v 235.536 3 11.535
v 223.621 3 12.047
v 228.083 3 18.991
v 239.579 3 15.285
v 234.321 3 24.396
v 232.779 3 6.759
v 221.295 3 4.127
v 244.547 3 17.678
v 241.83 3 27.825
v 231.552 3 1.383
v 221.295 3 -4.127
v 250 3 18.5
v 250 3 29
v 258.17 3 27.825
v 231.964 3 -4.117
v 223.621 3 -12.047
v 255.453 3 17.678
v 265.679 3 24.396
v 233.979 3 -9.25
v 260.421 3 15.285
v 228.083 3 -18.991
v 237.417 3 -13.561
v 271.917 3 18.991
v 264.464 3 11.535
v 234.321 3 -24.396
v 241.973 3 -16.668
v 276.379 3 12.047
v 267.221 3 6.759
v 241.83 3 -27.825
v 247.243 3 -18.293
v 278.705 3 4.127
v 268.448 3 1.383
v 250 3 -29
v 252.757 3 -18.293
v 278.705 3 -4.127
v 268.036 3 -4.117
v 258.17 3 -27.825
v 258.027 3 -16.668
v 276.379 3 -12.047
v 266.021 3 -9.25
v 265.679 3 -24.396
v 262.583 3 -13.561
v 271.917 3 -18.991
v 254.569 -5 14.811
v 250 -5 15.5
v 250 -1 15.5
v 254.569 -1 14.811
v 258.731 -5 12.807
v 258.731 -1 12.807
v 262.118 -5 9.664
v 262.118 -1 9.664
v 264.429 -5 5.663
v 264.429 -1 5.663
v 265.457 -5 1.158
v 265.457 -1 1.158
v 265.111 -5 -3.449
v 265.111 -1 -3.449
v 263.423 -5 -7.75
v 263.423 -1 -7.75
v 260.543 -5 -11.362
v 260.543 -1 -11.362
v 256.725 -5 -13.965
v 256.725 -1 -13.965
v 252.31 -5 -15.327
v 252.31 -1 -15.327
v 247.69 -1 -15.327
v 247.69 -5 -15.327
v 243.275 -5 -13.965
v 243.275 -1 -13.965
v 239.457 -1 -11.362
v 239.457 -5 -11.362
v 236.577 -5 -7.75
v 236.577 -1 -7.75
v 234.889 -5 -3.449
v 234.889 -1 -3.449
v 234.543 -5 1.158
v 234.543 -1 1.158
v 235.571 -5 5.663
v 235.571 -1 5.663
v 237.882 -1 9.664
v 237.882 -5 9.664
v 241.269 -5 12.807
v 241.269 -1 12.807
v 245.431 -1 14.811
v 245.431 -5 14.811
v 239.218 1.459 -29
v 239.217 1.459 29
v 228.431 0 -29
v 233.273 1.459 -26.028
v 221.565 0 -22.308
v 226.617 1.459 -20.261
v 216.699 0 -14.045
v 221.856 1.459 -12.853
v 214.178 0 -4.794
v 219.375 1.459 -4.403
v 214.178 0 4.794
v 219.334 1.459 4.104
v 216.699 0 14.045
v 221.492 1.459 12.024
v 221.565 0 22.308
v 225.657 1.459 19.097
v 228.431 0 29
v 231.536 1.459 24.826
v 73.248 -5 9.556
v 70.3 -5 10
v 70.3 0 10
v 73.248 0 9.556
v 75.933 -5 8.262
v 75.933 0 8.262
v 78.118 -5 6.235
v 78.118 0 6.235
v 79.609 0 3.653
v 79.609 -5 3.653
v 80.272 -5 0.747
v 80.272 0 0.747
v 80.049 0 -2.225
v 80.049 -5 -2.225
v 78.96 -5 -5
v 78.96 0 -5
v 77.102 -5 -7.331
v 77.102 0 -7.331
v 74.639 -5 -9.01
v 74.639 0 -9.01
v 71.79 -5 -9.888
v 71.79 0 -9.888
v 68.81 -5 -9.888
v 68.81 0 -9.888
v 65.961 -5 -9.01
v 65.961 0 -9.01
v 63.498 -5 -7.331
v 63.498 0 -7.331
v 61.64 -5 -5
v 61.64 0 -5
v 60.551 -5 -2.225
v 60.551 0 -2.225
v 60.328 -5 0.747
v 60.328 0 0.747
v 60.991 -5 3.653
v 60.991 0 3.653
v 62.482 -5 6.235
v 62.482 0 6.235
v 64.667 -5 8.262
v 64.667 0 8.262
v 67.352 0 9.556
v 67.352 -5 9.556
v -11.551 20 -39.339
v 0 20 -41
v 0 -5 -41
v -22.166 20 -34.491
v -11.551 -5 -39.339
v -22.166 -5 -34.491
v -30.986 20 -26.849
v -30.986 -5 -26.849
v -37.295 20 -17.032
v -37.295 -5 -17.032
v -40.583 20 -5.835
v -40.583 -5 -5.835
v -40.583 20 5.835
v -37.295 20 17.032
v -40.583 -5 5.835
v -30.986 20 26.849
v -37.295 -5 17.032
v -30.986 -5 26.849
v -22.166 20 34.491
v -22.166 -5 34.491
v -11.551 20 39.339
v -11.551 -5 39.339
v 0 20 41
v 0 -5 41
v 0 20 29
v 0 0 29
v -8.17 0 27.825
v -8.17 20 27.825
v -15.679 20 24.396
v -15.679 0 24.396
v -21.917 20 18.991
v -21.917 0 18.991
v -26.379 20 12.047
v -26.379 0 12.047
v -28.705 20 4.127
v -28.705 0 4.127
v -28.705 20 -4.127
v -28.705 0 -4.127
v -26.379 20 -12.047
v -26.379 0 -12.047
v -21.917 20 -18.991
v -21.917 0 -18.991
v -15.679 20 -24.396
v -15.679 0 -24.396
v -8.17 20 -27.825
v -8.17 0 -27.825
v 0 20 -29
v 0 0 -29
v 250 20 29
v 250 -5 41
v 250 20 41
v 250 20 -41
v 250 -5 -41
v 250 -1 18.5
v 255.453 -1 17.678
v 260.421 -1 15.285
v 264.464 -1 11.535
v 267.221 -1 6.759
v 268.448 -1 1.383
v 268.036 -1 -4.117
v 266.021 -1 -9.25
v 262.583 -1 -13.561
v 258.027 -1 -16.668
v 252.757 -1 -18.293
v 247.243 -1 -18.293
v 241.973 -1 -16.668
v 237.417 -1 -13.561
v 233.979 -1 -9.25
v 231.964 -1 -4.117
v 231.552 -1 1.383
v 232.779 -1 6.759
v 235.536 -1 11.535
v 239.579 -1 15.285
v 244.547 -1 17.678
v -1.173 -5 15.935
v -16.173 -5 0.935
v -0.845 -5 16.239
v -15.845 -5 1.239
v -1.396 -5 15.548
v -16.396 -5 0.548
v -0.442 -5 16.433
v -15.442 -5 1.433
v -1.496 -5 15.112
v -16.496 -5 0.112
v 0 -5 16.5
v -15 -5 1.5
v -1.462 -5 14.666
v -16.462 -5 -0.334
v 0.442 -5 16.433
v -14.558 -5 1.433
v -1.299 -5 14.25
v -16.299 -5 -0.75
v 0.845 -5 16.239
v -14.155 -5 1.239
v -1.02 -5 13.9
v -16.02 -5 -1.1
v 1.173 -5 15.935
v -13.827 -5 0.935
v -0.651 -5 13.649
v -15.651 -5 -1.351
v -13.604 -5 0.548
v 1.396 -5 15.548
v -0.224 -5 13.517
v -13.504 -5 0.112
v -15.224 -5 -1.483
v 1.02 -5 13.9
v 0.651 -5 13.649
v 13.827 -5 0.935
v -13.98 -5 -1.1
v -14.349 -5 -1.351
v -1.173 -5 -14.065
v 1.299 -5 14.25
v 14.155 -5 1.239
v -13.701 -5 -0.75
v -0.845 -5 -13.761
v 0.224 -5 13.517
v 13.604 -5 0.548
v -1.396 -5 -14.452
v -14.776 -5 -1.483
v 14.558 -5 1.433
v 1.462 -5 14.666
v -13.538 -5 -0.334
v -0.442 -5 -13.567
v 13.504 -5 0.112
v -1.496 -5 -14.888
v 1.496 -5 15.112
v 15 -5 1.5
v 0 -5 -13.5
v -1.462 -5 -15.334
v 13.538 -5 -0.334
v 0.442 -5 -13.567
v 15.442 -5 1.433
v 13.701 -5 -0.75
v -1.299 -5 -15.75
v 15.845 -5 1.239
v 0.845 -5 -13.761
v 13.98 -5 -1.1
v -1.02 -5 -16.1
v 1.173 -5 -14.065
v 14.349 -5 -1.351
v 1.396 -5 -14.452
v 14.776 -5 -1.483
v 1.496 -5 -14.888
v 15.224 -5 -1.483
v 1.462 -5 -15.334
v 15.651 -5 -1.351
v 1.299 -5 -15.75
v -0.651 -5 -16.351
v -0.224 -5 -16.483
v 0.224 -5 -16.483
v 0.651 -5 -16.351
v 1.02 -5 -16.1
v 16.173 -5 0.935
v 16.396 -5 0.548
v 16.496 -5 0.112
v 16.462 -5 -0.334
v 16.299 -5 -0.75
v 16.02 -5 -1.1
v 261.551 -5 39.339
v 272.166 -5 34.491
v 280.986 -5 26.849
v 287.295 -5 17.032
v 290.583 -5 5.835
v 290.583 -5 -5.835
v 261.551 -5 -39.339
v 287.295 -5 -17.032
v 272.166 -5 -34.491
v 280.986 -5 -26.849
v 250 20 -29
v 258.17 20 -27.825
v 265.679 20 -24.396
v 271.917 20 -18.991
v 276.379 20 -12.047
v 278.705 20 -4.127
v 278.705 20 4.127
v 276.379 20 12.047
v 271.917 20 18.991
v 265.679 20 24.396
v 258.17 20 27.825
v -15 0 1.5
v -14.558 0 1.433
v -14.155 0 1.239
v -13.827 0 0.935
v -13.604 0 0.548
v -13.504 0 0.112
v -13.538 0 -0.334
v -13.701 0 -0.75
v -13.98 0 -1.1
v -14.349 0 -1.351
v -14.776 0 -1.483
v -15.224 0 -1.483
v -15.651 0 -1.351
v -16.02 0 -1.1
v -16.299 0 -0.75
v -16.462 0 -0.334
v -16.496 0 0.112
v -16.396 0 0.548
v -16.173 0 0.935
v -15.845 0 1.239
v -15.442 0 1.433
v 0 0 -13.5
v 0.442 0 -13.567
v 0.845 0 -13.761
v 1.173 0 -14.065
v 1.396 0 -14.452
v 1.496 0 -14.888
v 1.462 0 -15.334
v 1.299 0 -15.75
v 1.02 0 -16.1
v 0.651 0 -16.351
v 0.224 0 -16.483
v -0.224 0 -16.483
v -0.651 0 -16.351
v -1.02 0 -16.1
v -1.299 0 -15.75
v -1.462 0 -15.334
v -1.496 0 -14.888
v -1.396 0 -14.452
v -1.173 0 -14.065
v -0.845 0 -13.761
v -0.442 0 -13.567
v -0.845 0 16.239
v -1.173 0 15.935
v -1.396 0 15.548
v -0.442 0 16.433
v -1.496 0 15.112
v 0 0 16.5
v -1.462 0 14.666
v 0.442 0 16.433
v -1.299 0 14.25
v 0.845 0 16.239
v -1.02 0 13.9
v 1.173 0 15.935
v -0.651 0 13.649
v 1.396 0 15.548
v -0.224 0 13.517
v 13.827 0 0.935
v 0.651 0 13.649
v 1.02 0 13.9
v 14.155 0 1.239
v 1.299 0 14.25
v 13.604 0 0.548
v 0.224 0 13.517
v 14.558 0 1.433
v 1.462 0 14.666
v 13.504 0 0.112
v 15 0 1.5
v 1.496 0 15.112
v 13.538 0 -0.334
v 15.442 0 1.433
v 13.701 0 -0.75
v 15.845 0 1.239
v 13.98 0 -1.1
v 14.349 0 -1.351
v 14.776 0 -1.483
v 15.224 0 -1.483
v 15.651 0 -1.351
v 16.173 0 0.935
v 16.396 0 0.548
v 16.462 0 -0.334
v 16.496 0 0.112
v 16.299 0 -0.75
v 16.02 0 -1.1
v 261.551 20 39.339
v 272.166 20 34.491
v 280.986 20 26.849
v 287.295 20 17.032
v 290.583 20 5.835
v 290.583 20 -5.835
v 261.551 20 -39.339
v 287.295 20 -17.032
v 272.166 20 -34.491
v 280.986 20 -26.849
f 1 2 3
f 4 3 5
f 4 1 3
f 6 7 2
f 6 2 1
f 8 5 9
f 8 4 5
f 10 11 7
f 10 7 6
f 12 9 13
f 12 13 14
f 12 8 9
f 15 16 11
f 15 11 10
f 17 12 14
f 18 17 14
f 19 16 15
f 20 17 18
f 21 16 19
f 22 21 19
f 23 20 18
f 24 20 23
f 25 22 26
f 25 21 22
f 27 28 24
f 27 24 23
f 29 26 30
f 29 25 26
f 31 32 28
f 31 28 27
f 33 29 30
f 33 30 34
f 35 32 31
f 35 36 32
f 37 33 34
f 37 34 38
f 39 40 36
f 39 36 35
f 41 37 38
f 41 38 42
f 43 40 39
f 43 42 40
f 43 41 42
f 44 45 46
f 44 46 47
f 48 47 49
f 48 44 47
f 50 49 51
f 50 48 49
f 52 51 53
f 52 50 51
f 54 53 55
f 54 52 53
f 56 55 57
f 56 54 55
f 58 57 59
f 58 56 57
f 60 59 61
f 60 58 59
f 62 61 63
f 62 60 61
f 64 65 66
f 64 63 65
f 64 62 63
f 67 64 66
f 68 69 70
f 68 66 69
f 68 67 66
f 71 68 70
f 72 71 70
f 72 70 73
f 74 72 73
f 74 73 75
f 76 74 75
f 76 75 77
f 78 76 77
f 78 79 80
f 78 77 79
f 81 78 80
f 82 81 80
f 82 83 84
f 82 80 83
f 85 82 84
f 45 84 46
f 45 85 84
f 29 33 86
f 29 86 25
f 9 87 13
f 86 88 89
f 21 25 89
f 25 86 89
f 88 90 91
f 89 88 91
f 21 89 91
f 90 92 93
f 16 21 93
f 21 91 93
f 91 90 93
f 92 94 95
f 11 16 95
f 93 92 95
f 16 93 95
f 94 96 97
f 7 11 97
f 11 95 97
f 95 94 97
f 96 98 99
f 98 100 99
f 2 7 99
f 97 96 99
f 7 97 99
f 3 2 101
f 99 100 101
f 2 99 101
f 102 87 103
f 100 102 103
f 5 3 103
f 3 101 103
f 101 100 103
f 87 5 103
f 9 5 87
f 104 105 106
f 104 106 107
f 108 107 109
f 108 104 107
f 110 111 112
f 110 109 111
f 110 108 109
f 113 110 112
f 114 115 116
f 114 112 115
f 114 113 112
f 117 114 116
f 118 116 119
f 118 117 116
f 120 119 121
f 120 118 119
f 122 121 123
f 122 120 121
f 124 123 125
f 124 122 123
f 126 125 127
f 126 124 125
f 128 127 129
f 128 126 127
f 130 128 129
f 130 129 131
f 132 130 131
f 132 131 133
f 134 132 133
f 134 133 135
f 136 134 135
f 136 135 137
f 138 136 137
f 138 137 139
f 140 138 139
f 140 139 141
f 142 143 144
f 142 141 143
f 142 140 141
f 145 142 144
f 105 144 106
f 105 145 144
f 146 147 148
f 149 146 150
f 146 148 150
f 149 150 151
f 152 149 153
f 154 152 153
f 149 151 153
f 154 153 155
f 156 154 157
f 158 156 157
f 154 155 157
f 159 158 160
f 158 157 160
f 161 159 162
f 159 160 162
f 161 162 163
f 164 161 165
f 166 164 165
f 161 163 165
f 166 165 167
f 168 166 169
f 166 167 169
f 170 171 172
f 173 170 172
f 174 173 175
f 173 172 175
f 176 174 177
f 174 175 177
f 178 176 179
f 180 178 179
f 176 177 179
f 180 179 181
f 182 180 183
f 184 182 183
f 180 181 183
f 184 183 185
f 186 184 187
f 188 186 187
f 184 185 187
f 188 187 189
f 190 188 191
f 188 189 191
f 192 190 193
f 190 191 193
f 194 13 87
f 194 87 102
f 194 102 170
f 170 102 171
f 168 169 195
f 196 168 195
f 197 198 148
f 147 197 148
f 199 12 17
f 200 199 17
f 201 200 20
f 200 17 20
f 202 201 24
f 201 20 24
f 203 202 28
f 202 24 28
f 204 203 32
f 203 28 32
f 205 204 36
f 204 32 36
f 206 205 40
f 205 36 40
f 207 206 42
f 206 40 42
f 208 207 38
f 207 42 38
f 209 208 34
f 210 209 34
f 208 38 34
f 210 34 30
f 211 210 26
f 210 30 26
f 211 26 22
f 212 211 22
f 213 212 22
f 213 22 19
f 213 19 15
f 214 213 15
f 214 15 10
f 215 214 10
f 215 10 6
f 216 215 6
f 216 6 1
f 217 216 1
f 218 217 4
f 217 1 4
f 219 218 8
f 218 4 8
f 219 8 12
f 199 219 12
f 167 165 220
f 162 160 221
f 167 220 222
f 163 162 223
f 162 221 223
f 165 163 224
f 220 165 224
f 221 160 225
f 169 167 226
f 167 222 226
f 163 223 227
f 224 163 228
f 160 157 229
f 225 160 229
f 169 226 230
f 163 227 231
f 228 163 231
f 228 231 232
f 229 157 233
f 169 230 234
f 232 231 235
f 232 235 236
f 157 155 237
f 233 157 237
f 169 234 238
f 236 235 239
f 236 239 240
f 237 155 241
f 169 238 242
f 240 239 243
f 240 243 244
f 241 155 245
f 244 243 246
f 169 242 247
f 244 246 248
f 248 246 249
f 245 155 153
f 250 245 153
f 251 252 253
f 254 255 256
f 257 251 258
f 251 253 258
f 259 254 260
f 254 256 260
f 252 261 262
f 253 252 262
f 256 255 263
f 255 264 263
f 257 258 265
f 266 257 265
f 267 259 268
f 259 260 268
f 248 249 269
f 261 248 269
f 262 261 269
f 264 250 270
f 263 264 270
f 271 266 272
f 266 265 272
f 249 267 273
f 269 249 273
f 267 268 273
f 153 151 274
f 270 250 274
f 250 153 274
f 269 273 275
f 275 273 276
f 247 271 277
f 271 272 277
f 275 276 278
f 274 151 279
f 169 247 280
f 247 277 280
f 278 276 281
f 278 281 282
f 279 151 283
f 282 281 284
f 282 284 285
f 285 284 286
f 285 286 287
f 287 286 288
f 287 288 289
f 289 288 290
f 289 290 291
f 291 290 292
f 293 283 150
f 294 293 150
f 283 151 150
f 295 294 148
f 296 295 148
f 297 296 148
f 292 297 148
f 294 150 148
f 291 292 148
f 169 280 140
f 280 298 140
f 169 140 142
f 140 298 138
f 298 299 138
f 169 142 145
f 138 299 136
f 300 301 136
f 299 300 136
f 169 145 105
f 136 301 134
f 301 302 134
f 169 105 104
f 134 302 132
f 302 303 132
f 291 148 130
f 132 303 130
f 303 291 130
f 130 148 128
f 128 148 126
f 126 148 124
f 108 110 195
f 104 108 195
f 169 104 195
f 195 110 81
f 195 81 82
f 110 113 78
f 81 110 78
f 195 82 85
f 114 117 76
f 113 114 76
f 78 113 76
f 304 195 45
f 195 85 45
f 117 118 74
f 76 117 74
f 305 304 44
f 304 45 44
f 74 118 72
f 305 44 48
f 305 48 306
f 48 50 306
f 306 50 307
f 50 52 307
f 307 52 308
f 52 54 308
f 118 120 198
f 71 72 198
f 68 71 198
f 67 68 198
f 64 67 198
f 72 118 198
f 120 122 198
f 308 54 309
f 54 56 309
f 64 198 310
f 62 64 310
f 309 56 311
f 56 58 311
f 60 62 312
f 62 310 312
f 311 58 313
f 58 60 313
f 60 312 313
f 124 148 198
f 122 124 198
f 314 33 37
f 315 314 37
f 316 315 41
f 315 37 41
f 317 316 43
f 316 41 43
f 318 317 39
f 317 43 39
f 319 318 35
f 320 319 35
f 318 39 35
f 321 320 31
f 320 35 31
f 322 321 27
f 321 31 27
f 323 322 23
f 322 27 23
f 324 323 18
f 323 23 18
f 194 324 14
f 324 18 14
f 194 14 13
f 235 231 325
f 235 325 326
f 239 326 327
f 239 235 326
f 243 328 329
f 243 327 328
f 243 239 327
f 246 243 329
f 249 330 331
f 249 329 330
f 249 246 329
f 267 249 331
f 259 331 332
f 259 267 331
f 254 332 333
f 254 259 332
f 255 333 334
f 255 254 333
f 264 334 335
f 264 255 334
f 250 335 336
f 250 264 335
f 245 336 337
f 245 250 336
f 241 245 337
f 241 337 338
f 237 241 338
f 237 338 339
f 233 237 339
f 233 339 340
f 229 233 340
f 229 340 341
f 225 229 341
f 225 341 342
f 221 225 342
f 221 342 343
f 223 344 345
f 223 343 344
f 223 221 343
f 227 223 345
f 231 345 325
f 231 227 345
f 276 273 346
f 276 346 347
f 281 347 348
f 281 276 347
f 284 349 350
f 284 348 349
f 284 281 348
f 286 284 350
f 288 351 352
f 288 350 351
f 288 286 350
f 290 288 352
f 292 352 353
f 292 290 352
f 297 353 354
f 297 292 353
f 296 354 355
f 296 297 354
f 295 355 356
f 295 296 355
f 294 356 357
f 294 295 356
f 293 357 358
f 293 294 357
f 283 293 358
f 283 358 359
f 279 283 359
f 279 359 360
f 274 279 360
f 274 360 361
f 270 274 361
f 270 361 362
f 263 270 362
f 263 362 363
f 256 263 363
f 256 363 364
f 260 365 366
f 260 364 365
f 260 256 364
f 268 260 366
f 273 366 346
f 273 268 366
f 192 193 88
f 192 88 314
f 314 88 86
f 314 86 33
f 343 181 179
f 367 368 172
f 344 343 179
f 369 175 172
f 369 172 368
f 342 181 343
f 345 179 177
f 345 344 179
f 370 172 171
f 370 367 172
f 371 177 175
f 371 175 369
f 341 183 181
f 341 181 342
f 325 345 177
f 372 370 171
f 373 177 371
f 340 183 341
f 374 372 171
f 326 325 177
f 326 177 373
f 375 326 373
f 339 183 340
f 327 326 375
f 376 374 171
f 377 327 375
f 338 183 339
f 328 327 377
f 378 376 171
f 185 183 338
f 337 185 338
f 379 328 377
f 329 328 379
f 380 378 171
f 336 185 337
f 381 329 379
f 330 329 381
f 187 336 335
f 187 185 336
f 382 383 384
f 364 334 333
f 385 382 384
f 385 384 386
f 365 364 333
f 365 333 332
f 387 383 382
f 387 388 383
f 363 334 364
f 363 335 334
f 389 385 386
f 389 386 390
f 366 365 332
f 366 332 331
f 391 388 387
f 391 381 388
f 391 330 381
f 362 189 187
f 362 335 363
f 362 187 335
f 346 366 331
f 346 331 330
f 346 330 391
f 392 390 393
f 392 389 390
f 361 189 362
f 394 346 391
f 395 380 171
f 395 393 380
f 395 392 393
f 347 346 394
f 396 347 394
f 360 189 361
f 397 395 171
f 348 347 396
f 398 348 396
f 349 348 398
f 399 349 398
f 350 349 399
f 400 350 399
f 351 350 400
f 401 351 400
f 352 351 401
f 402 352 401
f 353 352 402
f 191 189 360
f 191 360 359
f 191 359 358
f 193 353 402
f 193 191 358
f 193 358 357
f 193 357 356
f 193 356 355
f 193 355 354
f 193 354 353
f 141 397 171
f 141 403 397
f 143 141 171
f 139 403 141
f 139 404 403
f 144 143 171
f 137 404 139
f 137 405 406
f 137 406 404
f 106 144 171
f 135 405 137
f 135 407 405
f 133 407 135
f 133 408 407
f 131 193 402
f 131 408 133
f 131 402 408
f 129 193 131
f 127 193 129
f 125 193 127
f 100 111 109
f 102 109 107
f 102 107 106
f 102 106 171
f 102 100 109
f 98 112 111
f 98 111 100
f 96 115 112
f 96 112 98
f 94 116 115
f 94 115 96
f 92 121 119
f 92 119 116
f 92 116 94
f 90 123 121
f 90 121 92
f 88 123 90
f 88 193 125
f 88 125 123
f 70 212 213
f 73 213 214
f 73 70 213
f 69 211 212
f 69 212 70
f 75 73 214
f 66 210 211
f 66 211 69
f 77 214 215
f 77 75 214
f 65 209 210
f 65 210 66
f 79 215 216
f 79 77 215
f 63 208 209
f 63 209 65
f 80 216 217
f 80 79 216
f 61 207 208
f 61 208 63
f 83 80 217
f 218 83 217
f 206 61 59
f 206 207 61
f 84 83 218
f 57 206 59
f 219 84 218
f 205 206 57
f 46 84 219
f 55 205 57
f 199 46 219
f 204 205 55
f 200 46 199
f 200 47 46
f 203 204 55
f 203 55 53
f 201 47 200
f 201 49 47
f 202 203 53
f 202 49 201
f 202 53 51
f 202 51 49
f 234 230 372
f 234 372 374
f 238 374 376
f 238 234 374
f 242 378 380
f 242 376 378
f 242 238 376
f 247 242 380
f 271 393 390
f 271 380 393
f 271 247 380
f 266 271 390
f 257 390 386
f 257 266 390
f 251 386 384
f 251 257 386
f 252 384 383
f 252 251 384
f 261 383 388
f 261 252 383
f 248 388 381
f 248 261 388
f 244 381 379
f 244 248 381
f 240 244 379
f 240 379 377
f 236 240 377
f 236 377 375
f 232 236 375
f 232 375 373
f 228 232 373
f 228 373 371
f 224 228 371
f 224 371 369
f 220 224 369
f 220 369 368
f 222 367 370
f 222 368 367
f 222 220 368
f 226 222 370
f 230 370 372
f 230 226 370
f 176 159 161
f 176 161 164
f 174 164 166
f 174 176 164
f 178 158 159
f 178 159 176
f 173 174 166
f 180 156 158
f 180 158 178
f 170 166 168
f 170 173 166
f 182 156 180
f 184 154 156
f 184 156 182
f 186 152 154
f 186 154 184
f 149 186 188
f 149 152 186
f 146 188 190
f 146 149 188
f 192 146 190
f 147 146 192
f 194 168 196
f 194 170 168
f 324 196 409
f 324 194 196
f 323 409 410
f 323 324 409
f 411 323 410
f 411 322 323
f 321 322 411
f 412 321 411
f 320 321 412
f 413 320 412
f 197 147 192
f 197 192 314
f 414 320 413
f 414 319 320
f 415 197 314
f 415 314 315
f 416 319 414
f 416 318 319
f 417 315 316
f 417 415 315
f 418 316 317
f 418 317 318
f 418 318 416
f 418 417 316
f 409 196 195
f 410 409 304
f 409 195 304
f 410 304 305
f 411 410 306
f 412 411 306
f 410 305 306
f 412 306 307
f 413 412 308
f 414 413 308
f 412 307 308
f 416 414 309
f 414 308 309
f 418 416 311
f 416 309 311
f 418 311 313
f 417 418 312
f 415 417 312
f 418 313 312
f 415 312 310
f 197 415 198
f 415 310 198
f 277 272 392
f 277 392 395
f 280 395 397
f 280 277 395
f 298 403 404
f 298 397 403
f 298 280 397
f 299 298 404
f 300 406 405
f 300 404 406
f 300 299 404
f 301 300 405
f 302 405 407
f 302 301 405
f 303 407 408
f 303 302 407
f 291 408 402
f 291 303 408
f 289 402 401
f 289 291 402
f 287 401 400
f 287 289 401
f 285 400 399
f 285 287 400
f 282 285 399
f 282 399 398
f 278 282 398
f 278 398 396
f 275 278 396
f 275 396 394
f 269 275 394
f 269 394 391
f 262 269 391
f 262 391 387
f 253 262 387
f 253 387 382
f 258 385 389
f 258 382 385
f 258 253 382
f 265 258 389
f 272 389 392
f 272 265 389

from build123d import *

# Parameters (mm, degrees)
BOSS_EXTRUDE1_DEPTH     = 20
BOSS_EXTRUDE2_START     = -5
BOSS_EXTRUDE2_DEPTH     = 5
CUT_EXTRUDE1_DEPTH      = 295.553899991
CUT_EXTRUDE1_DEPTH_BACK = 295.553899991
SKETCH3_R               = 1.5
SKETCH4_R               = 29
BOSS_EXTRUDE3_DEPTH     = 3
SKETCH5_R               = 18.5
CUT_EXTRUDE2_DEPTH      = 4
CUT_EXTRUDE3_DEPTH      = 295.623488541
CUT_EXTRUDE3_DEPTH_BACK = 295.623488541
SKETCH6_R               = 15.5
FILLET1_R               = 10
CUT_EXTRUDE4_DEPTH      = 295.553899998
CUT_EXTRUDE4_DEPTH_BACK = 295.553899998
SKETCH7_R               = 10


with BuildPart() as part:
    # Sketch1 → Boss-Extrude1 (new body)
    with BuildSketch(Plane(origin=(0, 0, 0), x_dir=(1, 0, 0), z_dir=(0, 1, 0))):
        with BuildLine():
            Line((0, -41), (250, -41))
            ThreePointArc((250, -41), (291, 0), (250, 41))
            Line((250, 41), (0, 41))
            ThreePointArc((0, 41), (-41, 0), (0, -41))
        make_face()
        with BuildLine():
            Line((0, 29), (250, 29))
            ThreePointArc((250, 29), (279, 0), (250, -29))
            Line((250, -29), (0, -29))
            ThreePointArc((0, -29), (-29, 0), (0, 29))
        make_face(mode=Mode.SUBTRACT)
    extrude(amount=BOSS_EXTRUDE1_DEPTH)

    # Sketch1<2> → Boss-Extrude2 (add)
    with BuildSketch(Plane(origin=(0, 0, 0), x_dir=(1, 0, 0), z_dir=(0, 1, 0)).offset(BOSS_EXTRUDE2_START)):
        with BuildLine():
            ThreePointArc((0, 41), (-41, 0), (0, -41))
            Line((0, -41), (250, -41))
            ThreePointArc((250, -41), (291, 0), (250, 41))
            Line((250, 41), (0, 41))
        make_face()
    extrude(amount=BOSS_EXTRUDE2_DEPTH)

    # Sketch3 → Cut-Extrude1 (cut, two sides: drawn at the far end of the back side and taken through both)
    with BuildSketch(Plane(origin=(0, 0, 0), x_dir=(1, 0, 0), z_dir=(0, 1, 0)).offset(-CUT_EXTRUDE1_DEPTH_BACK)):
        with Locations(Location((0, 15, 0), (0, 0, 270))):
            Circle(SKETCH3_R)
        with Locations(Location((15, 0, 0), (0, 0, 270))):
            Circle(SKETCH3_R)
        with Locations(Location((0, -15, 0), (0, 0, 270))):
            Circle(SKETCH3_R)
        with Locations(Location((-15, 0, 0), (0, 0, 270))):
            Circle(SKETCH3_R)
    extrude(amount=CUT_EXTRUDE1_DEPTH + CUT_EXTRUDE1_DEPTH_BACK, mode=Mode.SUBTRACT)

    # Sketch4 → Boss-Extrude3 (add)
    with BuildSketch(Plane(origin=(0, 0, 0), x_dir=(1, 0, 0), z_dir=(0, 1, 0))):
        with Locations((250, 0)):
            Circle(SKETCH4_R)
    extrude(amount=BOSS_EXTRUDE3_DEPTH)

    # Sketch5 → Cut-Extrude2 (cut)
    with BuildSketch(Plane(origin=(0, 3, 0), x_dir=(1, 0, 0), z_dir=(0, 1, 0))):
        with Locations(Location((250, 0, 0), (0, 0, 270))):
            Circle(SKETCH5_R)
    extrude(amount=-CUT_EXTRUDE2_DEPTH, mode=Mode.SUBTRACT)

    # Sketch6 → Cut-Extrude3 (cut, two sides: drawn at the far end of the back side and taken through both)
    with BuildSketch(Plane(origin=(0, -1, 0), x_dir=(1, 0, 0), z_dir=(0, 1, 0)).offset(-CUT_EXTRUDE3_DEPTH_BACK)):
        with Locations(Location((250, 0, 0), (0, 0, 270))):
            Circle(SKETCH6_R)
    extrude(amount=CUT_EXTRUDE3_DEPTH + CUT_EXTRUDE3_DEPTH_BACK, mode=Mode.SUBTRACT)

    # Fillet1
    # the kernel refuses this fillet: 10 mm, written as the material it adds along each edge
    with BuildSketch(Plane(origin=(250, 0, 0), x_dir=(0.5782894613752282, 0, -0.8158316608604672), z_dir=(0.8158316608604672, 0, 0.5782894613752282))) as fillet1_piece_1:
        with BuildLine():
            CenterArc((36.141428429, 10), FILLET1_R, 224.427004001, 45.572995999)
            Line((36.141428429, 0), (36.141428429, -0.2))
            Line((36.141428429, -0.2), (29, -0.2))
            Line((29, -0.2), (28.8, 0))
            ThreePointArc((28.8, 0), (28.8, 1.5), (28.857171431, 2.86))
            Line((28.857171431, 2.86), (29, 3))
        make_face()
    revolve(axis=Axis((250, 0, 0), (0, 1, 0)), revolution_arc=250.660644369)

    # Sketch7 → Cut-Extrude4 (cut, two sides: drawn at the far end of the back side and taken through both)
    with BuildSketch(Plane(origin=(0, 0, 0), x_dir=(1, 0, 0), z_dir=(0, 1, 0)).offset(-CUT_EXTRUDE4_DEPTH_BACK)):
        with Locations(Location((70.3, 0, 0), (0, 0, 270))):
            Circle(SKETCH7_R)
    extrude(amount=CUT_EXTRUDE4_DEPTH + CUT_EXTRUDE4_DEPTH_BACK, mode=Mode.SUBTRACT)


solid = part.part
